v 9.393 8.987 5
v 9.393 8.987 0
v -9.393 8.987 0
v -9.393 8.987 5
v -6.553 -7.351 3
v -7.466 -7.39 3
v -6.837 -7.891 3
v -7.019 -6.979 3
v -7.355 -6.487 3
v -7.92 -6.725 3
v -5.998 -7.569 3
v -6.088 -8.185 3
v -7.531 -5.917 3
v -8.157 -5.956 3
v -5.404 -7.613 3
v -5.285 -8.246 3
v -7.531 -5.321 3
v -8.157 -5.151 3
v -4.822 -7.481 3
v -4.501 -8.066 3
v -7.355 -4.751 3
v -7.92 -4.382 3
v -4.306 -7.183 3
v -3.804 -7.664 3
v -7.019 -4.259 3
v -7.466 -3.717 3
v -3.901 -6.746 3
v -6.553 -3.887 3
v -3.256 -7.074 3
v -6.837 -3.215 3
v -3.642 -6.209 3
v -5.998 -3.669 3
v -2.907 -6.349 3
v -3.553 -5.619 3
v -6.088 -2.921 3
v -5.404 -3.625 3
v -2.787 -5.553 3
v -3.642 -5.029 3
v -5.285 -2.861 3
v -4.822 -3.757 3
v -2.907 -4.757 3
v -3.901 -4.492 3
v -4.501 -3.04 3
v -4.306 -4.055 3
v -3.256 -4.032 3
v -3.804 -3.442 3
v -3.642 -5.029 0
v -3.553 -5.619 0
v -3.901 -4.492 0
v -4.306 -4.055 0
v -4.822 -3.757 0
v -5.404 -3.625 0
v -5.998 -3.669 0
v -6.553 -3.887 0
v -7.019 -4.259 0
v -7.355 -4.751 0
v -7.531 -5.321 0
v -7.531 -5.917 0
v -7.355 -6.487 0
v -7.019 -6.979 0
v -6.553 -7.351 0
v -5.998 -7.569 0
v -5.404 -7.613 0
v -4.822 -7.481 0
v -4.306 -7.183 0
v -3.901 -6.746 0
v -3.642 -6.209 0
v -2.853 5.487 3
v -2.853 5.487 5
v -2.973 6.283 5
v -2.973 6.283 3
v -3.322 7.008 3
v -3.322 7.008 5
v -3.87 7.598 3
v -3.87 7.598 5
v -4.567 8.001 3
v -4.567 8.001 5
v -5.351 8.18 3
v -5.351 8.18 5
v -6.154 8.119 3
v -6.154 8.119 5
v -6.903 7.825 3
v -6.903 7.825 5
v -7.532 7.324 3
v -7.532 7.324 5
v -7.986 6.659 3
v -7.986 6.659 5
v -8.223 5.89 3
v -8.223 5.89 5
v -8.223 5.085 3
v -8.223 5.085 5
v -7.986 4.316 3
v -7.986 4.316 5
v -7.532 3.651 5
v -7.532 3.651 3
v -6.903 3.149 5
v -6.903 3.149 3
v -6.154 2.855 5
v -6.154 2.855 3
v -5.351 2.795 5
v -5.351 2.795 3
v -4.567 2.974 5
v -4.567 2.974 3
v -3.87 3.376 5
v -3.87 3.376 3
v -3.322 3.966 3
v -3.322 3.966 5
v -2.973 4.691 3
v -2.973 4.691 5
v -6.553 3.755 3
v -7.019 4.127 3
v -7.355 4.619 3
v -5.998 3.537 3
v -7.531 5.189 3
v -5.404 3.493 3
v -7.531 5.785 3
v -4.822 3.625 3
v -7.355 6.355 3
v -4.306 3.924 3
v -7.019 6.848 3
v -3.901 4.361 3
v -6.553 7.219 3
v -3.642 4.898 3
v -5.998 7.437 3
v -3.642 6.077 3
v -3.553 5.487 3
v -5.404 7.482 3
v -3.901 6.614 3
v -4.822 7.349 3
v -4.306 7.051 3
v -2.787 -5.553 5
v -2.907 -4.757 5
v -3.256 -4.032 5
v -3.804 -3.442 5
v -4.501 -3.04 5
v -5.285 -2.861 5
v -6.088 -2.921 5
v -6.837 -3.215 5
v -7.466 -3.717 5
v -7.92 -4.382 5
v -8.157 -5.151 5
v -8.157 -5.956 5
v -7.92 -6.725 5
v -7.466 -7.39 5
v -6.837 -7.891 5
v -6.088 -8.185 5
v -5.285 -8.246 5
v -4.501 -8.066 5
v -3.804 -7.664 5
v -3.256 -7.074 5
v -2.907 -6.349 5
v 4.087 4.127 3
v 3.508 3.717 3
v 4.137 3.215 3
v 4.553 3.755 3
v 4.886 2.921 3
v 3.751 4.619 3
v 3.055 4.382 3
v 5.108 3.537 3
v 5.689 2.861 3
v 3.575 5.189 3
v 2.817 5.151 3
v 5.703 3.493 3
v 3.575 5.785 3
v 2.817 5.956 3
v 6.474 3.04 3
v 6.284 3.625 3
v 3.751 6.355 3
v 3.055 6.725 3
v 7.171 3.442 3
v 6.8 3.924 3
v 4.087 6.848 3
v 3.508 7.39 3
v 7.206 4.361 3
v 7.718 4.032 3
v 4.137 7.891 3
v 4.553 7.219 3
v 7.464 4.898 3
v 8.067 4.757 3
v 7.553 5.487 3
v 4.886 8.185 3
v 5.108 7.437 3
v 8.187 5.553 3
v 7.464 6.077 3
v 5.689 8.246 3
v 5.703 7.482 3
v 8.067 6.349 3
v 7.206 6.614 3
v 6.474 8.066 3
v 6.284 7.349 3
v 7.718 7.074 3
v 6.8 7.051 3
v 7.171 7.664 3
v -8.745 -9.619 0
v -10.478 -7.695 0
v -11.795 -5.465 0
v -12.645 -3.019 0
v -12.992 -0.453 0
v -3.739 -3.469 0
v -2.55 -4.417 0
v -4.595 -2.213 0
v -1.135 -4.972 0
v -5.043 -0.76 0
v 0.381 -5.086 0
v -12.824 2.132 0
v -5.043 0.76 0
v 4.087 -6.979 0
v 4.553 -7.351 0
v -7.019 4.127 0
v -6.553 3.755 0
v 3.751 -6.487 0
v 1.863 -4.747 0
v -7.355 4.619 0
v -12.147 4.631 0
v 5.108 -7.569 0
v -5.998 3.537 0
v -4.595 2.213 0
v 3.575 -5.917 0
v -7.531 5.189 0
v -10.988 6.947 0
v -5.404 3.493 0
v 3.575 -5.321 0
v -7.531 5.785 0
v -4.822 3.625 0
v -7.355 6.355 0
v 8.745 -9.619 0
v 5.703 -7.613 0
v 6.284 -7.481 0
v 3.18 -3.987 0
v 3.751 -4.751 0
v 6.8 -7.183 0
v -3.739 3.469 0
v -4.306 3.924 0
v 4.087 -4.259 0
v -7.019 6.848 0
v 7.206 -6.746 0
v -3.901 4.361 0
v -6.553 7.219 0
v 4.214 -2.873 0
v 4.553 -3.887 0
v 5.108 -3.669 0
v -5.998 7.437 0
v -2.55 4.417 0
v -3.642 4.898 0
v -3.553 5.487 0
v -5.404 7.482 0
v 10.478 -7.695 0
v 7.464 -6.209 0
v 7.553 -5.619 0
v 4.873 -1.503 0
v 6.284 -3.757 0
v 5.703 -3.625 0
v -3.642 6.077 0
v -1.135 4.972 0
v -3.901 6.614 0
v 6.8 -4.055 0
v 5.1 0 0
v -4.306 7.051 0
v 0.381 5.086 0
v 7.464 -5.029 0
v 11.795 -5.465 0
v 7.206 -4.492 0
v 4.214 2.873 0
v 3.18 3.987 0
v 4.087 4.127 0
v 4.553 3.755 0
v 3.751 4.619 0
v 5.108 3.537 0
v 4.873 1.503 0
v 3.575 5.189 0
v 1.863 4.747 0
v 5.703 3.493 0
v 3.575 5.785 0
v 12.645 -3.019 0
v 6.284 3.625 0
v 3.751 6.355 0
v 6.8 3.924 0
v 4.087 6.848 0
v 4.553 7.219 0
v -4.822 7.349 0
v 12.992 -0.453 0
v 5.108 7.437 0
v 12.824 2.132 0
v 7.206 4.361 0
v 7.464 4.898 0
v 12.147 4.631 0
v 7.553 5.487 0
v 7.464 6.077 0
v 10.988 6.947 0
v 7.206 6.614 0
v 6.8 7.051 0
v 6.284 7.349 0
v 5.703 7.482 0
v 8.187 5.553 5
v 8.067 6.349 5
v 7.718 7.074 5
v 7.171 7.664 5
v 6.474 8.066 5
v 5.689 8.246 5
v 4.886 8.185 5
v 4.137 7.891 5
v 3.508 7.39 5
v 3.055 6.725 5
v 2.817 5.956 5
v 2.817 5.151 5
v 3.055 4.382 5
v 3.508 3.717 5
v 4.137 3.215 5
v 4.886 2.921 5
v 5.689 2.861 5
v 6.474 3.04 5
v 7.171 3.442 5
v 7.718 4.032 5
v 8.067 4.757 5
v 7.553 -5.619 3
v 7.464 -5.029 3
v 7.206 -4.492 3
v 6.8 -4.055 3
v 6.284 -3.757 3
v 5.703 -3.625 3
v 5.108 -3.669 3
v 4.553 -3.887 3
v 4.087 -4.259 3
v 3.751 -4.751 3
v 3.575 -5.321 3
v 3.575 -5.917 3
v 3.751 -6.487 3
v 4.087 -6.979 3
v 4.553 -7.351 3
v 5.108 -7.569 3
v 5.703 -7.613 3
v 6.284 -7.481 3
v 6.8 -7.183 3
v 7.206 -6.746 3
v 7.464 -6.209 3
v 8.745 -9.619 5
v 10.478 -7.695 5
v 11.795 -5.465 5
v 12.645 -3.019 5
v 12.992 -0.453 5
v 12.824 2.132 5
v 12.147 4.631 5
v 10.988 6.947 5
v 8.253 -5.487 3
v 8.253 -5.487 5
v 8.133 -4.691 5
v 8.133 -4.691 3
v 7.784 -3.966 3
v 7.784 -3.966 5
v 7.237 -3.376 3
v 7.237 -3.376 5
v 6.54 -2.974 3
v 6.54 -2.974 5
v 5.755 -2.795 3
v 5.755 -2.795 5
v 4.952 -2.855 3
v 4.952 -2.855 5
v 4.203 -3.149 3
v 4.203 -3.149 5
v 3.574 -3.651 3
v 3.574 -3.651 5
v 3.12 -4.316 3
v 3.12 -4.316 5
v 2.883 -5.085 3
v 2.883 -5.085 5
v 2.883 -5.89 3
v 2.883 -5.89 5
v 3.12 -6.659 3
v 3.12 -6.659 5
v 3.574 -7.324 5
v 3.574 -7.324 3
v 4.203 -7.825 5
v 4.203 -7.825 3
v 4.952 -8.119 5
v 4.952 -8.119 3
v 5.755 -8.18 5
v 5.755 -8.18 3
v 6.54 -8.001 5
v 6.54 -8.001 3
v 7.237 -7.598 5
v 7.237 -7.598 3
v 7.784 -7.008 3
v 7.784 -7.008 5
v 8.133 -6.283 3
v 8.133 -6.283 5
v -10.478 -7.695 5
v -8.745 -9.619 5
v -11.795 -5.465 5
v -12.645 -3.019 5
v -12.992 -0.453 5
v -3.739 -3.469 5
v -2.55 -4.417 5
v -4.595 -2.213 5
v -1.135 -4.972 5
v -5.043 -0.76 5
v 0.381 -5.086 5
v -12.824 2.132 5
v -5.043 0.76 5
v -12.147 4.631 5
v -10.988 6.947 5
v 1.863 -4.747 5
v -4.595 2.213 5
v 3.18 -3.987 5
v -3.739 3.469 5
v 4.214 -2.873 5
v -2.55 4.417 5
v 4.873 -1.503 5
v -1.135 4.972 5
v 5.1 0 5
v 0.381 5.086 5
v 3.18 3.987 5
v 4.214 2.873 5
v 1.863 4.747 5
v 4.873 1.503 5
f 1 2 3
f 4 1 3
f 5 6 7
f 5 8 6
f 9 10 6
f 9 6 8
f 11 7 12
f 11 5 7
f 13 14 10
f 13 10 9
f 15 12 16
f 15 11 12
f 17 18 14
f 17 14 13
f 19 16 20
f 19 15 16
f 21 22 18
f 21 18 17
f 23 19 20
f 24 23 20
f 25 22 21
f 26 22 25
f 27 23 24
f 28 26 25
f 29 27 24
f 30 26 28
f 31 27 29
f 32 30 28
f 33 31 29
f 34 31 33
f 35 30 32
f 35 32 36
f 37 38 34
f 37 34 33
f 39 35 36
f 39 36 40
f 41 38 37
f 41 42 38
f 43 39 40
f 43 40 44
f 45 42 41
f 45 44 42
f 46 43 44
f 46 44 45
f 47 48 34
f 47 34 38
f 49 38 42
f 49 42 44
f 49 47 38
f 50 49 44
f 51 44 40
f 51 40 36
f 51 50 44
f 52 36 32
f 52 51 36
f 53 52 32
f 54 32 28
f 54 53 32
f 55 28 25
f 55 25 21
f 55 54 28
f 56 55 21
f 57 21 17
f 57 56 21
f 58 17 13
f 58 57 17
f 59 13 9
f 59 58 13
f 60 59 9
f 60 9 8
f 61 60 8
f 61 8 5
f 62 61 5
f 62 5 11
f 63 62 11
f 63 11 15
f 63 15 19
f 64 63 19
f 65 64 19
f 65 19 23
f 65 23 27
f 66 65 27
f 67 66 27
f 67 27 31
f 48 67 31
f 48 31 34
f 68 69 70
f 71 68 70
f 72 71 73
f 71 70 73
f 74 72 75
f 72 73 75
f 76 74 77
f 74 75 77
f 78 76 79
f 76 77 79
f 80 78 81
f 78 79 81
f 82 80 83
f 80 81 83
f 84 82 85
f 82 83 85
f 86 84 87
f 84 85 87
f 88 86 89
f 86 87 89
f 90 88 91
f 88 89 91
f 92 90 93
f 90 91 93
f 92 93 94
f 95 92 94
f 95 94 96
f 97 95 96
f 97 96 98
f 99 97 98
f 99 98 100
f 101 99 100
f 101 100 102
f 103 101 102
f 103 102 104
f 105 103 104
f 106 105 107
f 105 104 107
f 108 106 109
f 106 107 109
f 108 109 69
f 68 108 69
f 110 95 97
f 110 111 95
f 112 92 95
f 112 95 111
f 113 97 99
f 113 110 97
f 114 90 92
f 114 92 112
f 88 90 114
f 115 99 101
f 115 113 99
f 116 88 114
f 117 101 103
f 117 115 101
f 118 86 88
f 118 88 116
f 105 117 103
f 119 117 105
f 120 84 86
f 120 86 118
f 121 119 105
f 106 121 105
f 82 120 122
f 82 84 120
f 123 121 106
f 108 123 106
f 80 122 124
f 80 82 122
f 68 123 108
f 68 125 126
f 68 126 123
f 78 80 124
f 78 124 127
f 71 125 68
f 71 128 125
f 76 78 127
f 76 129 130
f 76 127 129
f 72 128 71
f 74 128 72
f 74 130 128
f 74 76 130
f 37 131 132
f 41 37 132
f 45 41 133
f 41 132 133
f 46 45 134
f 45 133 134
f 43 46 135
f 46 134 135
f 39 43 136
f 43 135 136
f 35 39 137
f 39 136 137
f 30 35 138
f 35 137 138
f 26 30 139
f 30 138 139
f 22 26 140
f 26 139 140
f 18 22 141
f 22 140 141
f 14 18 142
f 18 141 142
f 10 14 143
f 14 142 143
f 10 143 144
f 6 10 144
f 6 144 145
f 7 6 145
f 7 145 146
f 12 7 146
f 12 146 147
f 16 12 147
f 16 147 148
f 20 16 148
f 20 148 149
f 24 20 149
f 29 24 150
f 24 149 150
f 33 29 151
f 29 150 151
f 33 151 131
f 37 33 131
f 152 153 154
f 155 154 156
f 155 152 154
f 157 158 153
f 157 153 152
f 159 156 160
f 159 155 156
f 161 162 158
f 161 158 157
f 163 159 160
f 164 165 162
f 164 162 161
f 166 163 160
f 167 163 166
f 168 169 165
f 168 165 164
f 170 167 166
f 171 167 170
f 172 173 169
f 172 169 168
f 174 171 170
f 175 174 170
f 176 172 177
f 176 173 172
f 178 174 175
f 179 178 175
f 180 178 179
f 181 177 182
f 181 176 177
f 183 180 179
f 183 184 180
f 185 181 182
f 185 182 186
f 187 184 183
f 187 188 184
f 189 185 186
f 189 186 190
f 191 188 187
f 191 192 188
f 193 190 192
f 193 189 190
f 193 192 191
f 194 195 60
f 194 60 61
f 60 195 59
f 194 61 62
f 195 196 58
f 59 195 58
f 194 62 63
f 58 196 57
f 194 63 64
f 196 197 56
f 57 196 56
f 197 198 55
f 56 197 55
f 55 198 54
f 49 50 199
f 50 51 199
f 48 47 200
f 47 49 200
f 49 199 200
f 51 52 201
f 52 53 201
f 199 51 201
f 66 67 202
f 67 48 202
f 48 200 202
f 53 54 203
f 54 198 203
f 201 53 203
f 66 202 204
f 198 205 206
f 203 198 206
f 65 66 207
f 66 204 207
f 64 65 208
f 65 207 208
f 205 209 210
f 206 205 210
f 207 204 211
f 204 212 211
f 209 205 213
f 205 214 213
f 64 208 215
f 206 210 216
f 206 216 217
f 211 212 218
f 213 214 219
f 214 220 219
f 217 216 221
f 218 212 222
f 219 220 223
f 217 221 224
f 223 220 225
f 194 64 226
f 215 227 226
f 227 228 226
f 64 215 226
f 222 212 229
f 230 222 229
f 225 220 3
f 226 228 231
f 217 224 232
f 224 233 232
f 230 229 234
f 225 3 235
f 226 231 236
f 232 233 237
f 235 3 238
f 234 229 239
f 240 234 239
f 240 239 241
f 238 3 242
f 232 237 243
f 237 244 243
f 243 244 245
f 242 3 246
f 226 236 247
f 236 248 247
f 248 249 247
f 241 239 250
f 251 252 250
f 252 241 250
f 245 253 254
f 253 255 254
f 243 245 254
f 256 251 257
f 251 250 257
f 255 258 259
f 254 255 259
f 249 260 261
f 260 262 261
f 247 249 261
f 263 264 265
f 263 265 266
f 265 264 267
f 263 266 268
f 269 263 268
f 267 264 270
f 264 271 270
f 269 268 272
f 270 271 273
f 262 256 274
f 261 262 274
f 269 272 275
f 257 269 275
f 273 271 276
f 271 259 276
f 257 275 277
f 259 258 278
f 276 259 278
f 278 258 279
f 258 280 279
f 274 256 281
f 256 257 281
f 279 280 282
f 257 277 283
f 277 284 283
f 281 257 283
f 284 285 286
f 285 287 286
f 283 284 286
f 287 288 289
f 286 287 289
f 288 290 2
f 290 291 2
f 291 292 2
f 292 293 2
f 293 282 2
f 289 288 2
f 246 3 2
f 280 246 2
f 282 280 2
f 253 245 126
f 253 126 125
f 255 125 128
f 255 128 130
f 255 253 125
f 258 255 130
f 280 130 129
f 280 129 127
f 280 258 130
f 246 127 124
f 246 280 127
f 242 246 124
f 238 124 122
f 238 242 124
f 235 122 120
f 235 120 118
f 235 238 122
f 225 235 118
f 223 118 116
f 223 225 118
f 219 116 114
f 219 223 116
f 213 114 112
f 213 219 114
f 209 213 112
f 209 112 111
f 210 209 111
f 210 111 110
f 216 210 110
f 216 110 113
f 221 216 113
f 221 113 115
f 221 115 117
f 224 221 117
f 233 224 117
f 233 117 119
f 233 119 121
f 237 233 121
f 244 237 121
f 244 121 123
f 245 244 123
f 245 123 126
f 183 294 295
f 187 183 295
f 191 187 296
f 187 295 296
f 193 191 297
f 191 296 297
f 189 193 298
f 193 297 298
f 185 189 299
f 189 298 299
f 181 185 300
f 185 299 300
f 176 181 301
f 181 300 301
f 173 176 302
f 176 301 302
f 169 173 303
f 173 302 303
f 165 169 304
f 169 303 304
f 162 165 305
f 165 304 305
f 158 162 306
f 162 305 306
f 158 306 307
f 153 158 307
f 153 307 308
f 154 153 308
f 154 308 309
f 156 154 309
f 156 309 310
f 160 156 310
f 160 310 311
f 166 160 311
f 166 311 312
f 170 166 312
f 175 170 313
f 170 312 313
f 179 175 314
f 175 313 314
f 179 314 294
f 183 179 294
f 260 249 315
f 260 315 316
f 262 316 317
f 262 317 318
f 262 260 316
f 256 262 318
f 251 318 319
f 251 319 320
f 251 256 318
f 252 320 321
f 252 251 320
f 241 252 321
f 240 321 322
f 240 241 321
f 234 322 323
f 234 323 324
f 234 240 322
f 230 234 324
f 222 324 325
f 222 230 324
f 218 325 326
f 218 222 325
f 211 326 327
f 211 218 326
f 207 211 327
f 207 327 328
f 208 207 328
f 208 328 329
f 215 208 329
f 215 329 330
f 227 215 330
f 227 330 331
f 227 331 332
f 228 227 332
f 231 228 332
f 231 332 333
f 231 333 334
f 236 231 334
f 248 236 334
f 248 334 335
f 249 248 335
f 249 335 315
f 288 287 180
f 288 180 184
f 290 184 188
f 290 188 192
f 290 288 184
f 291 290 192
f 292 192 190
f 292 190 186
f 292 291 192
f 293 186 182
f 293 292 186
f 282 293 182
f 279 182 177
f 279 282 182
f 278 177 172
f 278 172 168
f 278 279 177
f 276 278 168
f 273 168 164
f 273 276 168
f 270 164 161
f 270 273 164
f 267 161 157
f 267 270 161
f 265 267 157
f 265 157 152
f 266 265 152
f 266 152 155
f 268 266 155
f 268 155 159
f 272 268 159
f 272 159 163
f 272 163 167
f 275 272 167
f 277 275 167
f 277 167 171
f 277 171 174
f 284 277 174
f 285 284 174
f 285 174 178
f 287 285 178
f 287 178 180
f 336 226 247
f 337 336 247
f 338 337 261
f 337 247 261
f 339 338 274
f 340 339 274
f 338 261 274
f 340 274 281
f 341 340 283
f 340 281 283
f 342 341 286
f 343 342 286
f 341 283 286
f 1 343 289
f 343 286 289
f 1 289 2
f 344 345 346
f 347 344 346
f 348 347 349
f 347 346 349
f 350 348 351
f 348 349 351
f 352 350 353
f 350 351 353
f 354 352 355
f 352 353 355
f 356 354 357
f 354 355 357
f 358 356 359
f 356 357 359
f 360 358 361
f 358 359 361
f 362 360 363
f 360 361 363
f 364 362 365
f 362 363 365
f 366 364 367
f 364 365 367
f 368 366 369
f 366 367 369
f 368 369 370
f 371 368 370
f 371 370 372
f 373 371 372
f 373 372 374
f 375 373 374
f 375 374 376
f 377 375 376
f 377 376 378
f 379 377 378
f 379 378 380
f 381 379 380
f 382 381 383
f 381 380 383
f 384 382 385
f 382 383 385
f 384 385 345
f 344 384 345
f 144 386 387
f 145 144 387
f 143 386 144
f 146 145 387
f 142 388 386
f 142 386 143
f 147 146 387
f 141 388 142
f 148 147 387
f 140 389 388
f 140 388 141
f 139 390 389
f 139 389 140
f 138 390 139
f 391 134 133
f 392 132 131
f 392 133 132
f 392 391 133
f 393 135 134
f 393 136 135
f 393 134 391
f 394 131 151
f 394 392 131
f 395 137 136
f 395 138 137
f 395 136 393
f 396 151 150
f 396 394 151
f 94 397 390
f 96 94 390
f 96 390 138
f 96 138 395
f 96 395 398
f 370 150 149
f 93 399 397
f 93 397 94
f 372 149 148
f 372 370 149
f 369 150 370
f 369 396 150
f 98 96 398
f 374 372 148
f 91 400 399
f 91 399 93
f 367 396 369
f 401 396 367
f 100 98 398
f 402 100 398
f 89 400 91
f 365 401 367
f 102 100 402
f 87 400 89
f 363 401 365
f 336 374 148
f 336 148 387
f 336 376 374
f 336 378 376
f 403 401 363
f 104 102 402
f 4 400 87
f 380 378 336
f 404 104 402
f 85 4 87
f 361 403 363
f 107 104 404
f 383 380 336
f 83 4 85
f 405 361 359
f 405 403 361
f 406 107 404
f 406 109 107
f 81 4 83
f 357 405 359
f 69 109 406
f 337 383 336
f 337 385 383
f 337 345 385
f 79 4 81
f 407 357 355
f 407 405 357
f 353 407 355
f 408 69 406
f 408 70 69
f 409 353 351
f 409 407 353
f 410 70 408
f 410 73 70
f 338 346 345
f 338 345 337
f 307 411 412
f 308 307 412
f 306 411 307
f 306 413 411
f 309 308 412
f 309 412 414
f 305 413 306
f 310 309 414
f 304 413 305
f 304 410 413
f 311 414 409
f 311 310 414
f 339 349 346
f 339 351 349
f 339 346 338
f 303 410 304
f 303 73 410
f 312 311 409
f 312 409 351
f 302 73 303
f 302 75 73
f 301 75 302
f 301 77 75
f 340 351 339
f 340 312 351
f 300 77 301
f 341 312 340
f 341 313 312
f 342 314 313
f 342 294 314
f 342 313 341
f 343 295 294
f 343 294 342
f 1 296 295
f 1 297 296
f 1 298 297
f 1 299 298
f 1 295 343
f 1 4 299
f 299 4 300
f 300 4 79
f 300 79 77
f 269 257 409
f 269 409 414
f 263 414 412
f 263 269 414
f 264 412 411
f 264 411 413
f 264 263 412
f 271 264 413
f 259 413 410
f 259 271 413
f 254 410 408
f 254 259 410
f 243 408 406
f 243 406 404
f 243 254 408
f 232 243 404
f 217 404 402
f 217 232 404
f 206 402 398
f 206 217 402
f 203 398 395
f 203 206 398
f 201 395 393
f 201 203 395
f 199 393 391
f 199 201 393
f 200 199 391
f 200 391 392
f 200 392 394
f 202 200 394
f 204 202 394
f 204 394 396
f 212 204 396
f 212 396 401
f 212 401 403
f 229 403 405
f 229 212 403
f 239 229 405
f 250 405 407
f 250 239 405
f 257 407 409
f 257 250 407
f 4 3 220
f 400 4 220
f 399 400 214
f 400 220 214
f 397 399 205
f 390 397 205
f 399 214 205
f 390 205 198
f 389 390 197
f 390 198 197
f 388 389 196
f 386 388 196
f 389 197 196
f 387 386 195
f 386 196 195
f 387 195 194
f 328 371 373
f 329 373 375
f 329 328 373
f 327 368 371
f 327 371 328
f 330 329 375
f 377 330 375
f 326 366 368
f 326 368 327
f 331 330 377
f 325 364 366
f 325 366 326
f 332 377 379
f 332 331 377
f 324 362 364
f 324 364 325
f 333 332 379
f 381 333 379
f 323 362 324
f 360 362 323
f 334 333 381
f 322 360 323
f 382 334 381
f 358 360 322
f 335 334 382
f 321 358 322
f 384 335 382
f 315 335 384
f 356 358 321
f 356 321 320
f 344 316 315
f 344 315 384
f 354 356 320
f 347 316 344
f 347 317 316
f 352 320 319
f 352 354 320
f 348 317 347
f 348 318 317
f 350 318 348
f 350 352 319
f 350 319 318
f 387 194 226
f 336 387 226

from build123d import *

# Parameters (mm, degrees)
F0_R     = 2
F0_R_2   = 5.1
F1_DEPTH = 5
F2_R     = 2.7
F2_R_2   = 2
F3_DEPTH = 2


with BuildPart() as f1:
    # F0 (on Top) → F1 (new body)
    with BuildSketch(Plane.XY):
        with BuildLine():
            Line((-8.744989, -9.619), (8.744989, -9.619))
            ThreePointArc((8.744989, -9.619), (12.99212, -0.452563), (9.39311, 8.987185))
            Line((9.39311, 8.987185), (-9.39311, 8.987185))
            ThreePointArc((-9.39311, 8.987185), (-12.99212, -0.452563), (-8.744989, -9.619))
        make_face()
        with Locations((-5.553092, -5.619)):
            Circle(F0_R, mode=Mode.SUBTRACT)
        with Locations((5.553092, -5.619)):
            Circle(F0_R, mode=Mode.SUBTRACT)
        with Locations((-5.553092, 5.487185)):
            Circle(F0_R, mode=Mode.SUBTRACT)
        Circle(F0_R_2, mode=Mode.SUBTRACT)
        with Locations((5.553092, 5.487185)):
            Circle(F0_R, mode=Mode.SUBTRACT)
    extrude(amount=F1_DEPTH)

    # F2 (on face) → F3 (cut)
    with BuildSketch(Plane.XY.offset(5)):
        with Locations((-5.553092, 5.487185)):
            Circle(F2_R)
        with Locations((-5.553092, 5.487185)):
            Circle(F2_R_2, mode=Mode.SUBTRACT)
        with Locations((5.487185, 5.553092)):
            Circle(F2_R)
        with Locations((5.553092, 5.487185)):
            Circle(F2_R_2, mode=Mode.SUBTRACT)
        with Locations((5.553092, -5.487185)):
            Circle(F2_R)
        with Locations((5.553092, -5.619)):
            Circle(F2_R_2, mode=Mode.SUBTRACT)
        with Locations((-5.487185, -5.553092)):
            Circle(F2_R)
        with Locations((-5.553092, -5.619)):
            Circle(F2_R_2, mode=Mode.SUBTRACT)
    extrude(amount=-F3_DEPTH, mode=Mode.SUBTRACT)


solid = f1.part
